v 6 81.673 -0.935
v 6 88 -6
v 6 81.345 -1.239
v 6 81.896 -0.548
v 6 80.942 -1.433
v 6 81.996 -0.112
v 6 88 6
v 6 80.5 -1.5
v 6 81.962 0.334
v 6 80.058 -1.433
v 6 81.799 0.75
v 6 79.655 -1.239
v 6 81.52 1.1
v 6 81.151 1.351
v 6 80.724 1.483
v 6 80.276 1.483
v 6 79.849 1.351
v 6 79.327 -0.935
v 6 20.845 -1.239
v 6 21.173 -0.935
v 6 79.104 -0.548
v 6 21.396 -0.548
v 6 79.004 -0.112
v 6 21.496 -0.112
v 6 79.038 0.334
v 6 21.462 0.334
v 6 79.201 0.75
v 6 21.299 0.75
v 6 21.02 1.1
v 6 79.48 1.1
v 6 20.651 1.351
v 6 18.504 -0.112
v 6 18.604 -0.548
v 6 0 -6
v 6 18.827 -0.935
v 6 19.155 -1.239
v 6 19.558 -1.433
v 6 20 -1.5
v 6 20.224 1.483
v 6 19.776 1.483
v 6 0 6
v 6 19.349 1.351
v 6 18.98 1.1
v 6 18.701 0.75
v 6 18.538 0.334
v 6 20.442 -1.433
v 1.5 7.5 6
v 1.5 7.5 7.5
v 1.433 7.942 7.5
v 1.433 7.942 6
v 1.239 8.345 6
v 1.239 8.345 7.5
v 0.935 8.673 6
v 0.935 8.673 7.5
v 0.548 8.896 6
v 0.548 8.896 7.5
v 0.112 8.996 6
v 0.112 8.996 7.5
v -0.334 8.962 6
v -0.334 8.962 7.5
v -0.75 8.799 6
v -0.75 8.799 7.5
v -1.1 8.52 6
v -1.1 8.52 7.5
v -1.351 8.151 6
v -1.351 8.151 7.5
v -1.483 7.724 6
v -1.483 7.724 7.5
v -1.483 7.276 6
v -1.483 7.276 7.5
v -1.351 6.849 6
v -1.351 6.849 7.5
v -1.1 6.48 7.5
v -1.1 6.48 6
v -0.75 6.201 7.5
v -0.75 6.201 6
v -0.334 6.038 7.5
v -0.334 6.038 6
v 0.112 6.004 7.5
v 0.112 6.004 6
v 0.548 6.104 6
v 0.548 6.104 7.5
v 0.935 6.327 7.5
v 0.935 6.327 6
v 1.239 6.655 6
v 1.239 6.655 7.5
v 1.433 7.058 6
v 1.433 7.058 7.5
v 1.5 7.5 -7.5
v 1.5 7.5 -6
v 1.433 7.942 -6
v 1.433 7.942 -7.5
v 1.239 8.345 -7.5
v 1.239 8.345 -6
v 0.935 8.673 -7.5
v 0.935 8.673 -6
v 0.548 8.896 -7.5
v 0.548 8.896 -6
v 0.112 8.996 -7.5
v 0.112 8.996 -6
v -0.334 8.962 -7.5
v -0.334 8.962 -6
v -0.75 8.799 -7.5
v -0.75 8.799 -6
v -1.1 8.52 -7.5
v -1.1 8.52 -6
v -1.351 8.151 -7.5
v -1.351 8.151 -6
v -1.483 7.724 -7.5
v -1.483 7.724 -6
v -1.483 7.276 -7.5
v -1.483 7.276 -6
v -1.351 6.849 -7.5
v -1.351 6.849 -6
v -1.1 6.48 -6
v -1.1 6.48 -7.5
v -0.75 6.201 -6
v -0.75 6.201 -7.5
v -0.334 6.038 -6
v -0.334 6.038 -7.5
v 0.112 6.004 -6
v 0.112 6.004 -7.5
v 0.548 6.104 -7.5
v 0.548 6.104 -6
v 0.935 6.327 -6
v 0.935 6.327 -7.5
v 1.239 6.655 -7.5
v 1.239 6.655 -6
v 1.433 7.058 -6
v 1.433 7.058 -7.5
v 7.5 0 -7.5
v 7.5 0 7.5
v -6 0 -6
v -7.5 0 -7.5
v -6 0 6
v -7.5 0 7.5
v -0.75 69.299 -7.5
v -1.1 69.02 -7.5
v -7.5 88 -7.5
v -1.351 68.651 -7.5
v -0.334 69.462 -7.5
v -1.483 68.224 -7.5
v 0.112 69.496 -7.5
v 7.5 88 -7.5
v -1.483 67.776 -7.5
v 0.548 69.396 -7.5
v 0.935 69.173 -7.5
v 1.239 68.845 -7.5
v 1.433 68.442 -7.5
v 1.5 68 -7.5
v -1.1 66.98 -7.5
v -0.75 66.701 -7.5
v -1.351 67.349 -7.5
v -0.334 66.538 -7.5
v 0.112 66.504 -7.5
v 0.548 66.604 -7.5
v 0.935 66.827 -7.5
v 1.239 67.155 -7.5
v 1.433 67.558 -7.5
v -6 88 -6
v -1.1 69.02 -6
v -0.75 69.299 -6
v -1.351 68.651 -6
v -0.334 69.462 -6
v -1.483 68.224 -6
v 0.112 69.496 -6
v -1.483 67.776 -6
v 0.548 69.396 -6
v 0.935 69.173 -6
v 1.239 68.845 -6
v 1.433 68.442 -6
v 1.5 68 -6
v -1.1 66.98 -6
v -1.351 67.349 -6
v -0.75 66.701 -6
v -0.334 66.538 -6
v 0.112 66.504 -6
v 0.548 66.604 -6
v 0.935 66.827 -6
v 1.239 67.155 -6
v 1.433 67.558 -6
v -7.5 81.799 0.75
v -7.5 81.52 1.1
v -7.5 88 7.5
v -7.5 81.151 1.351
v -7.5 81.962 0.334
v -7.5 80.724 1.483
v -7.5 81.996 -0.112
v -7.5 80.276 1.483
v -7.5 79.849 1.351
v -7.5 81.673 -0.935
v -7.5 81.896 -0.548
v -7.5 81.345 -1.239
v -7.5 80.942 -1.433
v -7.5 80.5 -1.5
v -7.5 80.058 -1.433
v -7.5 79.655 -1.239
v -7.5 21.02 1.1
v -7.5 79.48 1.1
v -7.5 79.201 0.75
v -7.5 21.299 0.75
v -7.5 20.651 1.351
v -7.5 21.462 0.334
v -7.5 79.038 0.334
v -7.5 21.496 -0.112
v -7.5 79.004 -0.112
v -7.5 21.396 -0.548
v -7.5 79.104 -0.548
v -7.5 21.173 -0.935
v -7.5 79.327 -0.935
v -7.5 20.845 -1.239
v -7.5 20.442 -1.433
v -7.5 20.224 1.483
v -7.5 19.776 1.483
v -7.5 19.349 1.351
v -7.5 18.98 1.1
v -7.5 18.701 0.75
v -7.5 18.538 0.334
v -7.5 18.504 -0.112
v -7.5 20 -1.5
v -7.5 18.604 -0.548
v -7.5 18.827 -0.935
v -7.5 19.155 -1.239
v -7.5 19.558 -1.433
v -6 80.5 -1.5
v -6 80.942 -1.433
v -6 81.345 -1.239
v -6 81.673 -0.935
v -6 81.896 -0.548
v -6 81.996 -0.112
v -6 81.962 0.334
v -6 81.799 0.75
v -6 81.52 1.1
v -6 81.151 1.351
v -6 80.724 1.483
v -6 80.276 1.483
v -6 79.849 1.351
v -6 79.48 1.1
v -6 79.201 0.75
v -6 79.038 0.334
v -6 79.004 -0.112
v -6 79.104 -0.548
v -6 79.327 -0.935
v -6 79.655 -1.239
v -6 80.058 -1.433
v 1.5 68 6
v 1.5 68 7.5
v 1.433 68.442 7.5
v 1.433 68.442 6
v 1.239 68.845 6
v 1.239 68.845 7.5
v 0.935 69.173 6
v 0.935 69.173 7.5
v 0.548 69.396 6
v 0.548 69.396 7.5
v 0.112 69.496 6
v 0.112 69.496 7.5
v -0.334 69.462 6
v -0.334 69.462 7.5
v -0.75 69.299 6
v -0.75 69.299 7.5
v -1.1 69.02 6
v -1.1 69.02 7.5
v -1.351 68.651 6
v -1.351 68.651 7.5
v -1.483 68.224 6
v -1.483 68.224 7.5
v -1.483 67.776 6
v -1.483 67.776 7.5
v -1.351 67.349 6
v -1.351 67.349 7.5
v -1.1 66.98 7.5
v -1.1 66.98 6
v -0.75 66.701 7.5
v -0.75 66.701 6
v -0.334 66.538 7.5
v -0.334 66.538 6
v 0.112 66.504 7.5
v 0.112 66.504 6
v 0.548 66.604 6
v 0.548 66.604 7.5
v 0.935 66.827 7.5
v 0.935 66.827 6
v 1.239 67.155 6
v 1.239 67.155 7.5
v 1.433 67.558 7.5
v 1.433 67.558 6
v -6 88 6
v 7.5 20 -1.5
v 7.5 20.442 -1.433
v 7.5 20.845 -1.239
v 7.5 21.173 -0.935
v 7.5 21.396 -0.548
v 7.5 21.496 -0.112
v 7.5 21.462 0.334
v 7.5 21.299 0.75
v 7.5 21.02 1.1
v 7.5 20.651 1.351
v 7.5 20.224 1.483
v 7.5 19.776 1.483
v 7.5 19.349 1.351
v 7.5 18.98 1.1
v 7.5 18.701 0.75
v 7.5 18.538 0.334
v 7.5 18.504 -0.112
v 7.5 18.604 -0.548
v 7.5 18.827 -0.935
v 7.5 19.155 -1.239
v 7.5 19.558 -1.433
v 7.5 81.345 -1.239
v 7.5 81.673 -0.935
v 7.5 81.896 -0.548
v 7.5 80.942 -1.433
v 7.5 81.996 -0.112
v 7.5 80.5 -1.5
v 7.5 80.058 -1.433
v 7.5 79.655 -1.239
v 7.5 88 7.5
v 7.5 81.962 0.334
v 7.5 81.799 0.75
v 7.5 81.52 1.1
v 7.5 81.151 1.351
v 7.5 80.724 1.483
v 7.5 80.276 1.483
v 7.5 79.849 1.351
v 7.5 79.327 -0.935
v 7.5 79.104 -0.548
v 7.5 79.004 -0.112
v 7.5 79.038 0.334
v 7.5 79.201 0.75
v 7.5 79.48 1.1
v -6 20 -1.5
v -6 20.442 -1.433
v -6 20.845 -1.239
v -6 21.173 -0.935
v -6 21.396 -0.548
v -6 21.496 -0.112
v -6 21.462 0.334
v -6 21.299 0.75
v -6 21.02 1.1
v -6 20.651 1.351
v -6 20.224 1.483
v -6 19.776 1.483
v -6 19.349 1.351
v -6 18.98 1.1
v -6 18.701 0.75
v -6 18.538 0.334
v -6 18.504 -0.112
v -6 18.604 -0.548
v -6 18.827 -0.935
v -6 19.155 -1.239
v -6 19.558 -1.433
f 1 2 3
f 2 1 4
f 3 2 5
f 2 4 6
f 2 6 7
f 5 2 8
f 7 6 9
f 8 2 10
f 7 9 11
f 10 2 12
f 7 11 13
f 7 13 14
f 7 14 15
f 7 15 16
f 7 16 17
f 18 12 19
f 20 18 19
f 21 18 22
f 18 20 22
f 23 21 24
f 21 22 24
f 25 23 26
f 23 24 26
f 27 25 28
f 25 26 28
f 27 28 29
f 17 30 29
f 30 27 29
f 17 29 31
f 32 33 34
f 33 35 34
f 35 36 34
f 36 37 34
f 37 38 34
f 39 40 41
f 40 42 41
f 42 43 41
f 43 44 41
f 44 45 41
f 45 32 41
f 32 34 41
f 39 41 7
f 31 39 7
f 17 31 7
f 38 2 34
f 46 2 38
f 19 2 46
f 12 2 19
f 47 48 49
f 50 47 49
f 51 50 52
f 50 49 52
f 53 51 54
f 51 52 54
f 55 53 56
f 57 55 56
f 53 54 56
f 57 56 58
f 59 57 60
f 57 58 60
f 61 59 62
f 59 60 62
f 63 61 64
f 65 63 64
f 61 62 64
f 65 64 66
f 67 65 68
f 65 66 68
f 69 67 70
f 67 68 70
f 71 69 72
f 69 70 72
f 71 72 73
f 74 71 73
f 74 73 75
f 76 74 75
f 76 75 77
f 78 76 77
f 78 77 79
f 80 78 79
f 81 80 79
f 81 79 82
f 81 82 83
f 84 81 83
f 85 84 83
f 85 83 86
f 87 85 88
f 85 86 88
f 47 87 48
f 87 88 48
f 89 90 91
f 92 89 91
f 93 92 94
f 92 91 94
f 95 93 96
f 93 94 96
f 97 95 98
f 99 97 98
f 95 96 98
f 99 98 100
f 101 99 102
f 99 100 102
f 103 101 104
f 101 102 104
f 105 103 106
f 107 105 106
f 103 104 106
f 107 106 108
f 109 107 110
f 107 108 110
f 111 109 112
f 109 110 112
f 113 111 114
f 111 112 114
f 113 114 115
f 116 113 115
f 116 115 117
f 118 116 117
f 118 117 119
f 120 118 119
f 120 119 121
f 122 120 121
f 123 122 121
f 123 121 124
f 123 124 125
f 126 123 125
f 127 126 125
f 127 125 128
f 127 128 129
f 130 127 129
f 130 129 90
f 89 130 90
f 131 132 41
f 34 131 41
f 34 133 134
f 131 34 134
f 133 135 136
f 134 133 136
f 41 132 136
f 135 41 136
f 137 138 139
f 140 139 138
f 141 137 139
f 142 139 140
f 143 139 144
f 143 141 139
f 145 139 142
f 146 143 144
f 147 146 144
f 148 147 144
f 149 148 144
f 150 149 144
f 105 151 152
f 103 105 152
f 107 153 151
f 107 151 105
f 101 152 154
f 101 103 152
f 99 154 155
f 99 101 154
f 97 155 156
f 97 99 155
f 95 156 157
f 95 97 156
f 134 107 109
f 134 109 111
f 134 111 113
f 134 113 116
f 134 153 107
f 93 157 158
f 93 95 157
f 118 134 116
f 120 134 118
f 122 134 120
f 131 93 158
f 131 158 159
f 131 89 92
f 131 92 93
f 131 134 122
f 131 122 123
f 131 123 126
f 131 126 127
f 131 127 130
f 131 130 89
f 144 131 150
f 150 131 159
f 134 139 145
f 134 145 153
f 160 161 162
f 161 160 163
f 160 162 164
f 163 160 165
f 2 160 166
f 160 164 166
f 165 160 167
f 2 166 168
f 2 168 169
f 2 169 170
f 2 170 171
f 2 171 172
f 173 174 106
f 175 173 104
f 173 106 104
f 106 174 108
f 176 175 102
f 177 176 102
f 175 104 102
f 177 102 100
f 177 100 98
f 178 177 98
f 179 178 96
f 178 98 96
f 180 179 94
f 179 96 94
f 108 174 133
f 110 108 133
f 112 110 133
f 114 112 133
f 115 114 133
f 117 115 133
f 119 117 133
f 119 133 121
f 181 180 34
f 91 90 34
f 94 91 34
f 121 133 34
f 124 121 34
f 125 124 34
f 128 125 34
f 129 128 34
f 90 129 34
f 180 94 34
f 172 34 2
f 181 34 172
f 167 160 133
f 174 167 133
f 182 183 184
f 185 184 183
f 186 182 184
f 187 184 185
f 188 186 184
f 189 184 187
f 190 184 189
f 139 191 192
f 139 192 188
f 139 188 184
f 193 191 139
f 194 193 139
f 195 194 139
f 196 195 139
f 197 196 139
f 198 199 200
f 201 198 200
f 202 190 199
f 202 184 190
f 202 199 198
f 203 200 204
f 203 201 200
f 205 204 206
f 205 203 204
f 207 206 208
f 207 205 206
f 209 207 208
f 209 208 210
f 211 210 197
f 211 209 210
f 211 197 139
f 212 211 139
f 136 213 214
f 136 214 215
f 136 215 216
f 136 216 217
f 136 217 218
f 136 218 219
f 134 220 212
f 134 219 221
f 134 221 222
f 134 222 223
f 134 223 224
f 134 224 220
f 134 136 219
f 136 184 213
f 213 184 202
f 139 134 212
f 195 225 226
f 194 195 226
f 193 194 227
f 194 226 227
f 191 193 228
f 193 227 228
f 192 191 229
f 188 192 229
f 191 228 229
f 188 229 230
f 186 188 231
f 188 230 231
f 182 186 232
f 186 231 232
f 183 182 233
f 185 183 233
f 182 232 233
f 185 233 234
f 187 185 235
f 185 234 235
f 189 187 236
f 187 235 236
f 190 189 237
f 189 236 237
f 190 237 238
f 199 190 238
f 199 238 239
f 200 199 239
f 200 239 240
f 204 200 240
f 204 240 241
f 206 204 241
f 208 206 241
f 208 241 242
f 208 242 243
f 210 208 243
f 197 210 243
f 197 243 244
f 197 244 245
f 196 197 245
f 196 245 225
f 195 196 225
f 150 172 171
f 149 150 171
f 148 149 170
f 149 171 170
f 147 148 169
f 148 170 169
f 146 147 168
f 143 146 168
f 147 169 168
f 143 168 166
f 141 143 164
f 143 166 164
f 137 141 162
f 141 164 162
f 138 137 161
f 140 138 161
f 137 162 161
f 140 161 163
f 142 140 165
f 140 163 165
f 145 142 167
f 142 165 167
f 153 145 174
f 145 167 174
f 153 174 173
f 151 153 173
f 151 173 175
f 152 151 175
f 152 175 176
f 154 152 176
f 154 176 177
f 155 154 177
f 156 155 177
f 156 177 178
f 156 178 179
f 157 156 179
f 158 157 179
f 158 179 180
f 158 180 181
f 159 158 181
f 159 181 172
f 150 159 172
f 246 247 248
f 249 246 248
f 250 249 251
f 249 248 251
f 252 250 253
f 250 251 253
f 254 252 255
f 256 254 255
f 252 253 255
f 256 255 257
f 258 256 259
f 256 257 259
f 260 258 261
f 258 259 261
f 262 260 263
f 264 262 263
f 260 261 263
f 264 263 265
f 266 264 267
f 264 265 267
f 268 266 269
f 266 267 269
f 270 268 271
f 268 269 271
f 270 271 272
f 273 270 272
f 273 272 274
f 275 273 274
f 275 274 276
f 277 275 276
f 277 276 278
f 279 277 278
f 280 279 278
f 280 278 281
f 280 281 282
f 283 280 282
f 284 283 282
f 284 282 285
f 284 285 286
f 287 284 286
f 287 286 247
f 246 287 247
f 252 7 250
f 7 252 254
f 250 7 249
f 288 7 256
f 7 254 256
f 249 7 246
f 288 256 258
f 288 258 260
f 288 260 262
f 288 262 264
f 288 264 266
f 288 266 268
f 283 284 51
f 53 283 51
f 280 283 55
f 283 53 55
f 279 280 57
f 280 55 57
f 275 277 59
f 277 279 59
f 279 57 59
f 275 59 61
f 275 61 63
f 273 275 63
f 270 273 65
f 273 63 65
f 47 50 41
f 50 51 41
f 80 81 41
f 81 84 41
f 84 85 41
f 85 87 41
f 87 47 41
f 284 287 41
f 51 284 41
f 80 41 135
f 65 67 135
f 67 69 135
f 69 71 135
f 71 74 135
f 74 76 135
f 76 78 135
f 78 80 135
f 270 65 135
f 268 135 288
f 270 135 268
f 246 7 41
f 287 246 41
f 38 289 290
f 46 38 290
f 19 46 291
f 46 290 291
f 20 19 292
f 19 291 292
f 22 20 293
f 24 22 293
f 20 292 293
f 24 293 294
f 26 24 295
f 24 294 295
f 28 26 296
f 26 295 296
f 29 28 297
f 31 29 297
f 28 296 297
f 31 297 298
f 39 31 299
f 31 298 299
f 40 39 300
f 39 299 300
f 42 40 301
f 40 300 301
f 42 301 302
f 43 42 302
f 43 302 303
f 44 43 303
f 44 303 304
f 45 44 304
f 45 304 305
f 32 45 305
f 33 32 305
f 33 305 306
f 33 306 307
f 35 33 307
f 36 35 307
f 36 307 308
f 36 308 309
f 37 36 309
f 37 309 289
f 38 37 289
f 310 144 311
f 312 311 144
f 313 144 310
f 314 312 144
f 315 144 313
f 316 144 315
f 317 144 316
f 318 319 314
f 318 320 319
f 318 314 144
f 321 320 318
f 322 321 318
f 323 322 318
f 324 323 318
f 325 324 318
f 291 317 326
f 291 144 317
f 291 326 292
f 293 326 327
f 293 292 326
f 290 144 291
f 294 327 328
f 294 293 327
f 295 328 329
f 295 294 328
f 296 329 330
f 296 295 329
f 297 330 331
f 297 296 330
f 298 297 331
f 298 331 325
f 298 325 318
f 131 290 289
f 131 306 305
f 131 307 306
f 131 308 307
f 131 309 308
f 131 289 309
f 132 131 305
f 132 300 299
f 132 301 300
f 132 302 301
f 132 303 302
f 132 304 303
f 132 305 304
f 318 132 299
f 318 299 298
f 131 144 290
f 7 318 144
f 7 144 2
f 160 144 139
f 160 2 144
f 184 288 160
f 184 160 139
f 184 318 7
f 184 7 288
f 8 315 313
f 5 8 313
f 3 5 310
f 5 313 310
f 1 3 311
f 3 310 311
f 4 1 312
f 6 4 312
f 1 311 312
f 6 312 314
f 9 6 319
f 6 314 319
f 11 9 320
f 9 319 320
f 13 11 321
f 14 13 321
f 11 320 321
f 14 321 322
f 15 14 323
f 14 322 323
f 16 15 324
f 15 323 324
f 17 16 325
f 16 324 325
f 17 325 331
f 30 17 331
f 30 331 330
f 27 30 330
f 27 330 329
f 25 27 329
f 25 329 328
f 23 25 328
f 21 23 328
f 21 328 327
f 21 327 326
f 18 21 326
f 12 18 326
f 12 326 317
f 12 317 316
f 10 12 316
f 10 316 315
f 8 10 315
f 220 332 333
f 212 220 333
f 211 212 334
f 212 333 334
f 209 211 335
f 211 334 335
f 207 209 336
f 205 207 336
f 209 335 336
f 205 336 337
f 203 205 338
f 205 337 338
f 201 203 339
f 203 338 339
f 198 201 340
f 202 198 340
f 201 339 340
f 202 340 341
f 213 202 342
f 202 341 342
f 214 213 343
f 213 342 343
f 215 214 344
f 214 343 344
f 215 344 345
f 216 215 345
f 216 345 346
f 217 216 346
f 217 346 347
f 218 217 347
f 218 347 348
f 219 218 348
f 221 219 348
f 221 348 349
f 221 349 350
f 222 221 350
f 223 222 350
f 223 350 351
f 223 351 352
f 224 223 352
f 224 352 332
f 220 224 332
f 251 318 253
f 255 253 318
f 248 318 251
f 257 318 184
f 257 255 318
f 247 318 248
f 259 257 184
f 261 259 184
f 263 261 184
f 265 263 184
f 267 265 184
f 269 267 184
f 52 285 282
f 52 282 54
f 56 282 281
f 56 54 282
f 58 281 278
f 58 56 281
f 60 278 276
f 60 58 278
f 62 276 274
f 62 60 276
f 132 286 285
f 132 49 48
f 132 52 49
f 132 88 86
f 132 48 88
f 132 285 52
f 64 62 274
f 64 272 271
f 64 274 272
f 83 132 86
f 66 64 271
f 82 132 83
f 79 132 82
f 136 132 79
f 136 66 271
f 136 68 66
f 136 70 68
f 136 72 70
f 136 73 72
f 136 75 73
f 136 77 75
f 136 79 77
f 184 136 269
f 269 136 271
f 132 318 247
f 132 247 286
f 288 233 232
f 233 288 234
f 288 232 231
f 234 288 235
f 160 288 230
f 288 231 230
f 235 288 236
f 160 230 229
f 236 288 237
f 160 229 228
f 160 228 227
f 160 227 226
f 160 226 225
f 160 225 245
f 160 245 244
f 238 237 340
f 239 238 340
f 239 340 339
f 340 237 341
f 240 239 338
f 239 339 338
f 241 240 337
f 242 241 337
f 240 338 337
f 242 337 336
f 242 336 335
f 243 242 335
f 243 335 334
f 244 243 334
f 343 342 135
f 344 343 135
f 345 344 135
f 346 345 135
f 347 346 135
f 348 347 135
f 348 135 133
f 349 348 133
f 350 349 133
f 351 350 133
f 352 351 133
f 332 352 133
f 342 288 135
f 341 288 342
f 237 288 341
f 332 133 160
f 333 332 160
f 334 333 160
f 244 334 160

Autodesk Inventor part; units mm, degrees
ref_plane "YZ Plane" through (0, 0, 0) normal (1, 0, 0) x (0, 1, 0)
ref_plane "XZ Plane" through (0, 0, 0) normal (0, 1, 0) x (-1, 0, 0)
ref_plane "XY Plane" through (0, 0, 0) normal (0, 0, 1) x (1, 0, 0)
sketch "スケッチ1" plane through (0, 0, 0) normal (0, 1, 0) x (-1, 0, 0)
  line L0 (7.5, -7.5) -> (-7.5, -7.5)
  line L1 (-7.5, -7.5) -> (-7.5, 7.5)
  line L2 (-7.5, 7.5) -> (7.5, 7.5)
  line L3 (7.5, 7.5) -> (7.5, -7.5)
  line L4 (7.5, -7.5) -> (-7.5, 7.5) construction
  line L5 (-7.5, -7.5) -> (7.5, 7.5) construction
  line L6 (6, -6) -> (-6, -6)
  line L7 (-6, -6) -> (-6, 6)
  line L8 (-6, 6) -> (6, 6)
  line L9 (6, 6) -> (6, -6)
  point P0 (0, 0)
  dimension "d0" = 15
  dimension "d1" = 15
  dimension "d2" = 1.5
extrude "押し出し1" add sketch "スケッチ1" along normal blind 88
sketch "スケッチ2" plane through (-7.5, 0, 7.5) normal (0, 0, 1) x (1, 0, 0)
  line L0 (7.5, 0) -> (7.5, 88) construction
  line L1 (0, 88) -> (15, 88) projected
  line L2 (0, 0) -> (0, 88) projected
  line L3 (0, 44) -> (15, 44) construction
  line L4 (15, 0) -> (15, 88) projected
sketch "スケッチ3" plane through (7.5, 0, 7.5) normal (1, 0, 0) x (0, 0, -1)
  line L0 (7.5, 0) -> (7.5, 88) construction
  line L1 (0, 88) -> (15, 88) projected
  line L2 (15, 0) -> (15, 88) projected
  line L3 (15, 44) -> (0, 44) construction
  line L4 (0, 0) -> (0, 88) projected
sketch "スケッチ4" plane through (-7.5, 0, 7.5) normal (0, 0, 1) x (1, 0, 0)
  line L0 (7.5, 0) -> (7.5, 88) construction
  circle A0 centre (7.5, 7.5) radius 1.5
  line L1 (0, 0) -> (15, 0) projected
  circle A1 centre (7.5, 68) radius 1.5
  line L2 (0, 88) -> (15, 88) projected
  dimension "d5" = 3
  dimension "d6" = 7.5
  dimension "d13" = 3
  dimension "d14" = 20
extrude "押し出し2" cut sketch "スケッチ4" against normal through all
sketch "スケッチ5" plane through (7.5, 0, 7.5) normal (1, 0, 0) x (0, 0, -1)
  circle A0 centre (7.5, 20) radius 1.5
  line L0 (7.5, 0) -> (7.5, 88) construction
  line L1 (0, 0) -> (15, 0) projected
  circle A1 centre (7.5, 80.5) radius 1.5
  line L2 (0, 88) -> (15, 88) projected
  dimension "d9" = 3
  dimension "d10" = 20
  dimension "d15" = 3
  dimension "d16" = 7.5
extrude "押し出し3" cut sketch "スケッチ5" against normal through all
sketch "スケッチ6" plane through (7.5, 0, 7.5) normal (1, 0, 0) x (0, 0, -1)
  circle A0 centre (7.5, 80.5) radius 1.5 projected
  line L0 (0, 88) -> (15, 88) projected
  circle A1 centre (7.5, 20) radius 1.5 projected
  line L1 (0, 0) -> (15, 0) projected
  point P0 (7.5, 0)
  dimension "d17" = 7.5
  dimension "d18" = 68
  dimension "d19" = 88
sketch "スケッチ7" plane through (-7.5, 0, 7.5) normal (0, 0, 1) x (1, 0, 0)
  circle A0 centre (7.5, 68) radius 1.5 projected
  line L0 (0, 88) -> (15, 88) projected
  circle A1 centre (7.5, 7.5) radius 1.5 projected
  point P0 (7.5, 0)
  dimension "d20" = 20
  dimension "d21" = 80.5
equation "\"d1\" = d0"
properties part number "omu_k_jo_11" material "アルミニウム 6061-AHC"
